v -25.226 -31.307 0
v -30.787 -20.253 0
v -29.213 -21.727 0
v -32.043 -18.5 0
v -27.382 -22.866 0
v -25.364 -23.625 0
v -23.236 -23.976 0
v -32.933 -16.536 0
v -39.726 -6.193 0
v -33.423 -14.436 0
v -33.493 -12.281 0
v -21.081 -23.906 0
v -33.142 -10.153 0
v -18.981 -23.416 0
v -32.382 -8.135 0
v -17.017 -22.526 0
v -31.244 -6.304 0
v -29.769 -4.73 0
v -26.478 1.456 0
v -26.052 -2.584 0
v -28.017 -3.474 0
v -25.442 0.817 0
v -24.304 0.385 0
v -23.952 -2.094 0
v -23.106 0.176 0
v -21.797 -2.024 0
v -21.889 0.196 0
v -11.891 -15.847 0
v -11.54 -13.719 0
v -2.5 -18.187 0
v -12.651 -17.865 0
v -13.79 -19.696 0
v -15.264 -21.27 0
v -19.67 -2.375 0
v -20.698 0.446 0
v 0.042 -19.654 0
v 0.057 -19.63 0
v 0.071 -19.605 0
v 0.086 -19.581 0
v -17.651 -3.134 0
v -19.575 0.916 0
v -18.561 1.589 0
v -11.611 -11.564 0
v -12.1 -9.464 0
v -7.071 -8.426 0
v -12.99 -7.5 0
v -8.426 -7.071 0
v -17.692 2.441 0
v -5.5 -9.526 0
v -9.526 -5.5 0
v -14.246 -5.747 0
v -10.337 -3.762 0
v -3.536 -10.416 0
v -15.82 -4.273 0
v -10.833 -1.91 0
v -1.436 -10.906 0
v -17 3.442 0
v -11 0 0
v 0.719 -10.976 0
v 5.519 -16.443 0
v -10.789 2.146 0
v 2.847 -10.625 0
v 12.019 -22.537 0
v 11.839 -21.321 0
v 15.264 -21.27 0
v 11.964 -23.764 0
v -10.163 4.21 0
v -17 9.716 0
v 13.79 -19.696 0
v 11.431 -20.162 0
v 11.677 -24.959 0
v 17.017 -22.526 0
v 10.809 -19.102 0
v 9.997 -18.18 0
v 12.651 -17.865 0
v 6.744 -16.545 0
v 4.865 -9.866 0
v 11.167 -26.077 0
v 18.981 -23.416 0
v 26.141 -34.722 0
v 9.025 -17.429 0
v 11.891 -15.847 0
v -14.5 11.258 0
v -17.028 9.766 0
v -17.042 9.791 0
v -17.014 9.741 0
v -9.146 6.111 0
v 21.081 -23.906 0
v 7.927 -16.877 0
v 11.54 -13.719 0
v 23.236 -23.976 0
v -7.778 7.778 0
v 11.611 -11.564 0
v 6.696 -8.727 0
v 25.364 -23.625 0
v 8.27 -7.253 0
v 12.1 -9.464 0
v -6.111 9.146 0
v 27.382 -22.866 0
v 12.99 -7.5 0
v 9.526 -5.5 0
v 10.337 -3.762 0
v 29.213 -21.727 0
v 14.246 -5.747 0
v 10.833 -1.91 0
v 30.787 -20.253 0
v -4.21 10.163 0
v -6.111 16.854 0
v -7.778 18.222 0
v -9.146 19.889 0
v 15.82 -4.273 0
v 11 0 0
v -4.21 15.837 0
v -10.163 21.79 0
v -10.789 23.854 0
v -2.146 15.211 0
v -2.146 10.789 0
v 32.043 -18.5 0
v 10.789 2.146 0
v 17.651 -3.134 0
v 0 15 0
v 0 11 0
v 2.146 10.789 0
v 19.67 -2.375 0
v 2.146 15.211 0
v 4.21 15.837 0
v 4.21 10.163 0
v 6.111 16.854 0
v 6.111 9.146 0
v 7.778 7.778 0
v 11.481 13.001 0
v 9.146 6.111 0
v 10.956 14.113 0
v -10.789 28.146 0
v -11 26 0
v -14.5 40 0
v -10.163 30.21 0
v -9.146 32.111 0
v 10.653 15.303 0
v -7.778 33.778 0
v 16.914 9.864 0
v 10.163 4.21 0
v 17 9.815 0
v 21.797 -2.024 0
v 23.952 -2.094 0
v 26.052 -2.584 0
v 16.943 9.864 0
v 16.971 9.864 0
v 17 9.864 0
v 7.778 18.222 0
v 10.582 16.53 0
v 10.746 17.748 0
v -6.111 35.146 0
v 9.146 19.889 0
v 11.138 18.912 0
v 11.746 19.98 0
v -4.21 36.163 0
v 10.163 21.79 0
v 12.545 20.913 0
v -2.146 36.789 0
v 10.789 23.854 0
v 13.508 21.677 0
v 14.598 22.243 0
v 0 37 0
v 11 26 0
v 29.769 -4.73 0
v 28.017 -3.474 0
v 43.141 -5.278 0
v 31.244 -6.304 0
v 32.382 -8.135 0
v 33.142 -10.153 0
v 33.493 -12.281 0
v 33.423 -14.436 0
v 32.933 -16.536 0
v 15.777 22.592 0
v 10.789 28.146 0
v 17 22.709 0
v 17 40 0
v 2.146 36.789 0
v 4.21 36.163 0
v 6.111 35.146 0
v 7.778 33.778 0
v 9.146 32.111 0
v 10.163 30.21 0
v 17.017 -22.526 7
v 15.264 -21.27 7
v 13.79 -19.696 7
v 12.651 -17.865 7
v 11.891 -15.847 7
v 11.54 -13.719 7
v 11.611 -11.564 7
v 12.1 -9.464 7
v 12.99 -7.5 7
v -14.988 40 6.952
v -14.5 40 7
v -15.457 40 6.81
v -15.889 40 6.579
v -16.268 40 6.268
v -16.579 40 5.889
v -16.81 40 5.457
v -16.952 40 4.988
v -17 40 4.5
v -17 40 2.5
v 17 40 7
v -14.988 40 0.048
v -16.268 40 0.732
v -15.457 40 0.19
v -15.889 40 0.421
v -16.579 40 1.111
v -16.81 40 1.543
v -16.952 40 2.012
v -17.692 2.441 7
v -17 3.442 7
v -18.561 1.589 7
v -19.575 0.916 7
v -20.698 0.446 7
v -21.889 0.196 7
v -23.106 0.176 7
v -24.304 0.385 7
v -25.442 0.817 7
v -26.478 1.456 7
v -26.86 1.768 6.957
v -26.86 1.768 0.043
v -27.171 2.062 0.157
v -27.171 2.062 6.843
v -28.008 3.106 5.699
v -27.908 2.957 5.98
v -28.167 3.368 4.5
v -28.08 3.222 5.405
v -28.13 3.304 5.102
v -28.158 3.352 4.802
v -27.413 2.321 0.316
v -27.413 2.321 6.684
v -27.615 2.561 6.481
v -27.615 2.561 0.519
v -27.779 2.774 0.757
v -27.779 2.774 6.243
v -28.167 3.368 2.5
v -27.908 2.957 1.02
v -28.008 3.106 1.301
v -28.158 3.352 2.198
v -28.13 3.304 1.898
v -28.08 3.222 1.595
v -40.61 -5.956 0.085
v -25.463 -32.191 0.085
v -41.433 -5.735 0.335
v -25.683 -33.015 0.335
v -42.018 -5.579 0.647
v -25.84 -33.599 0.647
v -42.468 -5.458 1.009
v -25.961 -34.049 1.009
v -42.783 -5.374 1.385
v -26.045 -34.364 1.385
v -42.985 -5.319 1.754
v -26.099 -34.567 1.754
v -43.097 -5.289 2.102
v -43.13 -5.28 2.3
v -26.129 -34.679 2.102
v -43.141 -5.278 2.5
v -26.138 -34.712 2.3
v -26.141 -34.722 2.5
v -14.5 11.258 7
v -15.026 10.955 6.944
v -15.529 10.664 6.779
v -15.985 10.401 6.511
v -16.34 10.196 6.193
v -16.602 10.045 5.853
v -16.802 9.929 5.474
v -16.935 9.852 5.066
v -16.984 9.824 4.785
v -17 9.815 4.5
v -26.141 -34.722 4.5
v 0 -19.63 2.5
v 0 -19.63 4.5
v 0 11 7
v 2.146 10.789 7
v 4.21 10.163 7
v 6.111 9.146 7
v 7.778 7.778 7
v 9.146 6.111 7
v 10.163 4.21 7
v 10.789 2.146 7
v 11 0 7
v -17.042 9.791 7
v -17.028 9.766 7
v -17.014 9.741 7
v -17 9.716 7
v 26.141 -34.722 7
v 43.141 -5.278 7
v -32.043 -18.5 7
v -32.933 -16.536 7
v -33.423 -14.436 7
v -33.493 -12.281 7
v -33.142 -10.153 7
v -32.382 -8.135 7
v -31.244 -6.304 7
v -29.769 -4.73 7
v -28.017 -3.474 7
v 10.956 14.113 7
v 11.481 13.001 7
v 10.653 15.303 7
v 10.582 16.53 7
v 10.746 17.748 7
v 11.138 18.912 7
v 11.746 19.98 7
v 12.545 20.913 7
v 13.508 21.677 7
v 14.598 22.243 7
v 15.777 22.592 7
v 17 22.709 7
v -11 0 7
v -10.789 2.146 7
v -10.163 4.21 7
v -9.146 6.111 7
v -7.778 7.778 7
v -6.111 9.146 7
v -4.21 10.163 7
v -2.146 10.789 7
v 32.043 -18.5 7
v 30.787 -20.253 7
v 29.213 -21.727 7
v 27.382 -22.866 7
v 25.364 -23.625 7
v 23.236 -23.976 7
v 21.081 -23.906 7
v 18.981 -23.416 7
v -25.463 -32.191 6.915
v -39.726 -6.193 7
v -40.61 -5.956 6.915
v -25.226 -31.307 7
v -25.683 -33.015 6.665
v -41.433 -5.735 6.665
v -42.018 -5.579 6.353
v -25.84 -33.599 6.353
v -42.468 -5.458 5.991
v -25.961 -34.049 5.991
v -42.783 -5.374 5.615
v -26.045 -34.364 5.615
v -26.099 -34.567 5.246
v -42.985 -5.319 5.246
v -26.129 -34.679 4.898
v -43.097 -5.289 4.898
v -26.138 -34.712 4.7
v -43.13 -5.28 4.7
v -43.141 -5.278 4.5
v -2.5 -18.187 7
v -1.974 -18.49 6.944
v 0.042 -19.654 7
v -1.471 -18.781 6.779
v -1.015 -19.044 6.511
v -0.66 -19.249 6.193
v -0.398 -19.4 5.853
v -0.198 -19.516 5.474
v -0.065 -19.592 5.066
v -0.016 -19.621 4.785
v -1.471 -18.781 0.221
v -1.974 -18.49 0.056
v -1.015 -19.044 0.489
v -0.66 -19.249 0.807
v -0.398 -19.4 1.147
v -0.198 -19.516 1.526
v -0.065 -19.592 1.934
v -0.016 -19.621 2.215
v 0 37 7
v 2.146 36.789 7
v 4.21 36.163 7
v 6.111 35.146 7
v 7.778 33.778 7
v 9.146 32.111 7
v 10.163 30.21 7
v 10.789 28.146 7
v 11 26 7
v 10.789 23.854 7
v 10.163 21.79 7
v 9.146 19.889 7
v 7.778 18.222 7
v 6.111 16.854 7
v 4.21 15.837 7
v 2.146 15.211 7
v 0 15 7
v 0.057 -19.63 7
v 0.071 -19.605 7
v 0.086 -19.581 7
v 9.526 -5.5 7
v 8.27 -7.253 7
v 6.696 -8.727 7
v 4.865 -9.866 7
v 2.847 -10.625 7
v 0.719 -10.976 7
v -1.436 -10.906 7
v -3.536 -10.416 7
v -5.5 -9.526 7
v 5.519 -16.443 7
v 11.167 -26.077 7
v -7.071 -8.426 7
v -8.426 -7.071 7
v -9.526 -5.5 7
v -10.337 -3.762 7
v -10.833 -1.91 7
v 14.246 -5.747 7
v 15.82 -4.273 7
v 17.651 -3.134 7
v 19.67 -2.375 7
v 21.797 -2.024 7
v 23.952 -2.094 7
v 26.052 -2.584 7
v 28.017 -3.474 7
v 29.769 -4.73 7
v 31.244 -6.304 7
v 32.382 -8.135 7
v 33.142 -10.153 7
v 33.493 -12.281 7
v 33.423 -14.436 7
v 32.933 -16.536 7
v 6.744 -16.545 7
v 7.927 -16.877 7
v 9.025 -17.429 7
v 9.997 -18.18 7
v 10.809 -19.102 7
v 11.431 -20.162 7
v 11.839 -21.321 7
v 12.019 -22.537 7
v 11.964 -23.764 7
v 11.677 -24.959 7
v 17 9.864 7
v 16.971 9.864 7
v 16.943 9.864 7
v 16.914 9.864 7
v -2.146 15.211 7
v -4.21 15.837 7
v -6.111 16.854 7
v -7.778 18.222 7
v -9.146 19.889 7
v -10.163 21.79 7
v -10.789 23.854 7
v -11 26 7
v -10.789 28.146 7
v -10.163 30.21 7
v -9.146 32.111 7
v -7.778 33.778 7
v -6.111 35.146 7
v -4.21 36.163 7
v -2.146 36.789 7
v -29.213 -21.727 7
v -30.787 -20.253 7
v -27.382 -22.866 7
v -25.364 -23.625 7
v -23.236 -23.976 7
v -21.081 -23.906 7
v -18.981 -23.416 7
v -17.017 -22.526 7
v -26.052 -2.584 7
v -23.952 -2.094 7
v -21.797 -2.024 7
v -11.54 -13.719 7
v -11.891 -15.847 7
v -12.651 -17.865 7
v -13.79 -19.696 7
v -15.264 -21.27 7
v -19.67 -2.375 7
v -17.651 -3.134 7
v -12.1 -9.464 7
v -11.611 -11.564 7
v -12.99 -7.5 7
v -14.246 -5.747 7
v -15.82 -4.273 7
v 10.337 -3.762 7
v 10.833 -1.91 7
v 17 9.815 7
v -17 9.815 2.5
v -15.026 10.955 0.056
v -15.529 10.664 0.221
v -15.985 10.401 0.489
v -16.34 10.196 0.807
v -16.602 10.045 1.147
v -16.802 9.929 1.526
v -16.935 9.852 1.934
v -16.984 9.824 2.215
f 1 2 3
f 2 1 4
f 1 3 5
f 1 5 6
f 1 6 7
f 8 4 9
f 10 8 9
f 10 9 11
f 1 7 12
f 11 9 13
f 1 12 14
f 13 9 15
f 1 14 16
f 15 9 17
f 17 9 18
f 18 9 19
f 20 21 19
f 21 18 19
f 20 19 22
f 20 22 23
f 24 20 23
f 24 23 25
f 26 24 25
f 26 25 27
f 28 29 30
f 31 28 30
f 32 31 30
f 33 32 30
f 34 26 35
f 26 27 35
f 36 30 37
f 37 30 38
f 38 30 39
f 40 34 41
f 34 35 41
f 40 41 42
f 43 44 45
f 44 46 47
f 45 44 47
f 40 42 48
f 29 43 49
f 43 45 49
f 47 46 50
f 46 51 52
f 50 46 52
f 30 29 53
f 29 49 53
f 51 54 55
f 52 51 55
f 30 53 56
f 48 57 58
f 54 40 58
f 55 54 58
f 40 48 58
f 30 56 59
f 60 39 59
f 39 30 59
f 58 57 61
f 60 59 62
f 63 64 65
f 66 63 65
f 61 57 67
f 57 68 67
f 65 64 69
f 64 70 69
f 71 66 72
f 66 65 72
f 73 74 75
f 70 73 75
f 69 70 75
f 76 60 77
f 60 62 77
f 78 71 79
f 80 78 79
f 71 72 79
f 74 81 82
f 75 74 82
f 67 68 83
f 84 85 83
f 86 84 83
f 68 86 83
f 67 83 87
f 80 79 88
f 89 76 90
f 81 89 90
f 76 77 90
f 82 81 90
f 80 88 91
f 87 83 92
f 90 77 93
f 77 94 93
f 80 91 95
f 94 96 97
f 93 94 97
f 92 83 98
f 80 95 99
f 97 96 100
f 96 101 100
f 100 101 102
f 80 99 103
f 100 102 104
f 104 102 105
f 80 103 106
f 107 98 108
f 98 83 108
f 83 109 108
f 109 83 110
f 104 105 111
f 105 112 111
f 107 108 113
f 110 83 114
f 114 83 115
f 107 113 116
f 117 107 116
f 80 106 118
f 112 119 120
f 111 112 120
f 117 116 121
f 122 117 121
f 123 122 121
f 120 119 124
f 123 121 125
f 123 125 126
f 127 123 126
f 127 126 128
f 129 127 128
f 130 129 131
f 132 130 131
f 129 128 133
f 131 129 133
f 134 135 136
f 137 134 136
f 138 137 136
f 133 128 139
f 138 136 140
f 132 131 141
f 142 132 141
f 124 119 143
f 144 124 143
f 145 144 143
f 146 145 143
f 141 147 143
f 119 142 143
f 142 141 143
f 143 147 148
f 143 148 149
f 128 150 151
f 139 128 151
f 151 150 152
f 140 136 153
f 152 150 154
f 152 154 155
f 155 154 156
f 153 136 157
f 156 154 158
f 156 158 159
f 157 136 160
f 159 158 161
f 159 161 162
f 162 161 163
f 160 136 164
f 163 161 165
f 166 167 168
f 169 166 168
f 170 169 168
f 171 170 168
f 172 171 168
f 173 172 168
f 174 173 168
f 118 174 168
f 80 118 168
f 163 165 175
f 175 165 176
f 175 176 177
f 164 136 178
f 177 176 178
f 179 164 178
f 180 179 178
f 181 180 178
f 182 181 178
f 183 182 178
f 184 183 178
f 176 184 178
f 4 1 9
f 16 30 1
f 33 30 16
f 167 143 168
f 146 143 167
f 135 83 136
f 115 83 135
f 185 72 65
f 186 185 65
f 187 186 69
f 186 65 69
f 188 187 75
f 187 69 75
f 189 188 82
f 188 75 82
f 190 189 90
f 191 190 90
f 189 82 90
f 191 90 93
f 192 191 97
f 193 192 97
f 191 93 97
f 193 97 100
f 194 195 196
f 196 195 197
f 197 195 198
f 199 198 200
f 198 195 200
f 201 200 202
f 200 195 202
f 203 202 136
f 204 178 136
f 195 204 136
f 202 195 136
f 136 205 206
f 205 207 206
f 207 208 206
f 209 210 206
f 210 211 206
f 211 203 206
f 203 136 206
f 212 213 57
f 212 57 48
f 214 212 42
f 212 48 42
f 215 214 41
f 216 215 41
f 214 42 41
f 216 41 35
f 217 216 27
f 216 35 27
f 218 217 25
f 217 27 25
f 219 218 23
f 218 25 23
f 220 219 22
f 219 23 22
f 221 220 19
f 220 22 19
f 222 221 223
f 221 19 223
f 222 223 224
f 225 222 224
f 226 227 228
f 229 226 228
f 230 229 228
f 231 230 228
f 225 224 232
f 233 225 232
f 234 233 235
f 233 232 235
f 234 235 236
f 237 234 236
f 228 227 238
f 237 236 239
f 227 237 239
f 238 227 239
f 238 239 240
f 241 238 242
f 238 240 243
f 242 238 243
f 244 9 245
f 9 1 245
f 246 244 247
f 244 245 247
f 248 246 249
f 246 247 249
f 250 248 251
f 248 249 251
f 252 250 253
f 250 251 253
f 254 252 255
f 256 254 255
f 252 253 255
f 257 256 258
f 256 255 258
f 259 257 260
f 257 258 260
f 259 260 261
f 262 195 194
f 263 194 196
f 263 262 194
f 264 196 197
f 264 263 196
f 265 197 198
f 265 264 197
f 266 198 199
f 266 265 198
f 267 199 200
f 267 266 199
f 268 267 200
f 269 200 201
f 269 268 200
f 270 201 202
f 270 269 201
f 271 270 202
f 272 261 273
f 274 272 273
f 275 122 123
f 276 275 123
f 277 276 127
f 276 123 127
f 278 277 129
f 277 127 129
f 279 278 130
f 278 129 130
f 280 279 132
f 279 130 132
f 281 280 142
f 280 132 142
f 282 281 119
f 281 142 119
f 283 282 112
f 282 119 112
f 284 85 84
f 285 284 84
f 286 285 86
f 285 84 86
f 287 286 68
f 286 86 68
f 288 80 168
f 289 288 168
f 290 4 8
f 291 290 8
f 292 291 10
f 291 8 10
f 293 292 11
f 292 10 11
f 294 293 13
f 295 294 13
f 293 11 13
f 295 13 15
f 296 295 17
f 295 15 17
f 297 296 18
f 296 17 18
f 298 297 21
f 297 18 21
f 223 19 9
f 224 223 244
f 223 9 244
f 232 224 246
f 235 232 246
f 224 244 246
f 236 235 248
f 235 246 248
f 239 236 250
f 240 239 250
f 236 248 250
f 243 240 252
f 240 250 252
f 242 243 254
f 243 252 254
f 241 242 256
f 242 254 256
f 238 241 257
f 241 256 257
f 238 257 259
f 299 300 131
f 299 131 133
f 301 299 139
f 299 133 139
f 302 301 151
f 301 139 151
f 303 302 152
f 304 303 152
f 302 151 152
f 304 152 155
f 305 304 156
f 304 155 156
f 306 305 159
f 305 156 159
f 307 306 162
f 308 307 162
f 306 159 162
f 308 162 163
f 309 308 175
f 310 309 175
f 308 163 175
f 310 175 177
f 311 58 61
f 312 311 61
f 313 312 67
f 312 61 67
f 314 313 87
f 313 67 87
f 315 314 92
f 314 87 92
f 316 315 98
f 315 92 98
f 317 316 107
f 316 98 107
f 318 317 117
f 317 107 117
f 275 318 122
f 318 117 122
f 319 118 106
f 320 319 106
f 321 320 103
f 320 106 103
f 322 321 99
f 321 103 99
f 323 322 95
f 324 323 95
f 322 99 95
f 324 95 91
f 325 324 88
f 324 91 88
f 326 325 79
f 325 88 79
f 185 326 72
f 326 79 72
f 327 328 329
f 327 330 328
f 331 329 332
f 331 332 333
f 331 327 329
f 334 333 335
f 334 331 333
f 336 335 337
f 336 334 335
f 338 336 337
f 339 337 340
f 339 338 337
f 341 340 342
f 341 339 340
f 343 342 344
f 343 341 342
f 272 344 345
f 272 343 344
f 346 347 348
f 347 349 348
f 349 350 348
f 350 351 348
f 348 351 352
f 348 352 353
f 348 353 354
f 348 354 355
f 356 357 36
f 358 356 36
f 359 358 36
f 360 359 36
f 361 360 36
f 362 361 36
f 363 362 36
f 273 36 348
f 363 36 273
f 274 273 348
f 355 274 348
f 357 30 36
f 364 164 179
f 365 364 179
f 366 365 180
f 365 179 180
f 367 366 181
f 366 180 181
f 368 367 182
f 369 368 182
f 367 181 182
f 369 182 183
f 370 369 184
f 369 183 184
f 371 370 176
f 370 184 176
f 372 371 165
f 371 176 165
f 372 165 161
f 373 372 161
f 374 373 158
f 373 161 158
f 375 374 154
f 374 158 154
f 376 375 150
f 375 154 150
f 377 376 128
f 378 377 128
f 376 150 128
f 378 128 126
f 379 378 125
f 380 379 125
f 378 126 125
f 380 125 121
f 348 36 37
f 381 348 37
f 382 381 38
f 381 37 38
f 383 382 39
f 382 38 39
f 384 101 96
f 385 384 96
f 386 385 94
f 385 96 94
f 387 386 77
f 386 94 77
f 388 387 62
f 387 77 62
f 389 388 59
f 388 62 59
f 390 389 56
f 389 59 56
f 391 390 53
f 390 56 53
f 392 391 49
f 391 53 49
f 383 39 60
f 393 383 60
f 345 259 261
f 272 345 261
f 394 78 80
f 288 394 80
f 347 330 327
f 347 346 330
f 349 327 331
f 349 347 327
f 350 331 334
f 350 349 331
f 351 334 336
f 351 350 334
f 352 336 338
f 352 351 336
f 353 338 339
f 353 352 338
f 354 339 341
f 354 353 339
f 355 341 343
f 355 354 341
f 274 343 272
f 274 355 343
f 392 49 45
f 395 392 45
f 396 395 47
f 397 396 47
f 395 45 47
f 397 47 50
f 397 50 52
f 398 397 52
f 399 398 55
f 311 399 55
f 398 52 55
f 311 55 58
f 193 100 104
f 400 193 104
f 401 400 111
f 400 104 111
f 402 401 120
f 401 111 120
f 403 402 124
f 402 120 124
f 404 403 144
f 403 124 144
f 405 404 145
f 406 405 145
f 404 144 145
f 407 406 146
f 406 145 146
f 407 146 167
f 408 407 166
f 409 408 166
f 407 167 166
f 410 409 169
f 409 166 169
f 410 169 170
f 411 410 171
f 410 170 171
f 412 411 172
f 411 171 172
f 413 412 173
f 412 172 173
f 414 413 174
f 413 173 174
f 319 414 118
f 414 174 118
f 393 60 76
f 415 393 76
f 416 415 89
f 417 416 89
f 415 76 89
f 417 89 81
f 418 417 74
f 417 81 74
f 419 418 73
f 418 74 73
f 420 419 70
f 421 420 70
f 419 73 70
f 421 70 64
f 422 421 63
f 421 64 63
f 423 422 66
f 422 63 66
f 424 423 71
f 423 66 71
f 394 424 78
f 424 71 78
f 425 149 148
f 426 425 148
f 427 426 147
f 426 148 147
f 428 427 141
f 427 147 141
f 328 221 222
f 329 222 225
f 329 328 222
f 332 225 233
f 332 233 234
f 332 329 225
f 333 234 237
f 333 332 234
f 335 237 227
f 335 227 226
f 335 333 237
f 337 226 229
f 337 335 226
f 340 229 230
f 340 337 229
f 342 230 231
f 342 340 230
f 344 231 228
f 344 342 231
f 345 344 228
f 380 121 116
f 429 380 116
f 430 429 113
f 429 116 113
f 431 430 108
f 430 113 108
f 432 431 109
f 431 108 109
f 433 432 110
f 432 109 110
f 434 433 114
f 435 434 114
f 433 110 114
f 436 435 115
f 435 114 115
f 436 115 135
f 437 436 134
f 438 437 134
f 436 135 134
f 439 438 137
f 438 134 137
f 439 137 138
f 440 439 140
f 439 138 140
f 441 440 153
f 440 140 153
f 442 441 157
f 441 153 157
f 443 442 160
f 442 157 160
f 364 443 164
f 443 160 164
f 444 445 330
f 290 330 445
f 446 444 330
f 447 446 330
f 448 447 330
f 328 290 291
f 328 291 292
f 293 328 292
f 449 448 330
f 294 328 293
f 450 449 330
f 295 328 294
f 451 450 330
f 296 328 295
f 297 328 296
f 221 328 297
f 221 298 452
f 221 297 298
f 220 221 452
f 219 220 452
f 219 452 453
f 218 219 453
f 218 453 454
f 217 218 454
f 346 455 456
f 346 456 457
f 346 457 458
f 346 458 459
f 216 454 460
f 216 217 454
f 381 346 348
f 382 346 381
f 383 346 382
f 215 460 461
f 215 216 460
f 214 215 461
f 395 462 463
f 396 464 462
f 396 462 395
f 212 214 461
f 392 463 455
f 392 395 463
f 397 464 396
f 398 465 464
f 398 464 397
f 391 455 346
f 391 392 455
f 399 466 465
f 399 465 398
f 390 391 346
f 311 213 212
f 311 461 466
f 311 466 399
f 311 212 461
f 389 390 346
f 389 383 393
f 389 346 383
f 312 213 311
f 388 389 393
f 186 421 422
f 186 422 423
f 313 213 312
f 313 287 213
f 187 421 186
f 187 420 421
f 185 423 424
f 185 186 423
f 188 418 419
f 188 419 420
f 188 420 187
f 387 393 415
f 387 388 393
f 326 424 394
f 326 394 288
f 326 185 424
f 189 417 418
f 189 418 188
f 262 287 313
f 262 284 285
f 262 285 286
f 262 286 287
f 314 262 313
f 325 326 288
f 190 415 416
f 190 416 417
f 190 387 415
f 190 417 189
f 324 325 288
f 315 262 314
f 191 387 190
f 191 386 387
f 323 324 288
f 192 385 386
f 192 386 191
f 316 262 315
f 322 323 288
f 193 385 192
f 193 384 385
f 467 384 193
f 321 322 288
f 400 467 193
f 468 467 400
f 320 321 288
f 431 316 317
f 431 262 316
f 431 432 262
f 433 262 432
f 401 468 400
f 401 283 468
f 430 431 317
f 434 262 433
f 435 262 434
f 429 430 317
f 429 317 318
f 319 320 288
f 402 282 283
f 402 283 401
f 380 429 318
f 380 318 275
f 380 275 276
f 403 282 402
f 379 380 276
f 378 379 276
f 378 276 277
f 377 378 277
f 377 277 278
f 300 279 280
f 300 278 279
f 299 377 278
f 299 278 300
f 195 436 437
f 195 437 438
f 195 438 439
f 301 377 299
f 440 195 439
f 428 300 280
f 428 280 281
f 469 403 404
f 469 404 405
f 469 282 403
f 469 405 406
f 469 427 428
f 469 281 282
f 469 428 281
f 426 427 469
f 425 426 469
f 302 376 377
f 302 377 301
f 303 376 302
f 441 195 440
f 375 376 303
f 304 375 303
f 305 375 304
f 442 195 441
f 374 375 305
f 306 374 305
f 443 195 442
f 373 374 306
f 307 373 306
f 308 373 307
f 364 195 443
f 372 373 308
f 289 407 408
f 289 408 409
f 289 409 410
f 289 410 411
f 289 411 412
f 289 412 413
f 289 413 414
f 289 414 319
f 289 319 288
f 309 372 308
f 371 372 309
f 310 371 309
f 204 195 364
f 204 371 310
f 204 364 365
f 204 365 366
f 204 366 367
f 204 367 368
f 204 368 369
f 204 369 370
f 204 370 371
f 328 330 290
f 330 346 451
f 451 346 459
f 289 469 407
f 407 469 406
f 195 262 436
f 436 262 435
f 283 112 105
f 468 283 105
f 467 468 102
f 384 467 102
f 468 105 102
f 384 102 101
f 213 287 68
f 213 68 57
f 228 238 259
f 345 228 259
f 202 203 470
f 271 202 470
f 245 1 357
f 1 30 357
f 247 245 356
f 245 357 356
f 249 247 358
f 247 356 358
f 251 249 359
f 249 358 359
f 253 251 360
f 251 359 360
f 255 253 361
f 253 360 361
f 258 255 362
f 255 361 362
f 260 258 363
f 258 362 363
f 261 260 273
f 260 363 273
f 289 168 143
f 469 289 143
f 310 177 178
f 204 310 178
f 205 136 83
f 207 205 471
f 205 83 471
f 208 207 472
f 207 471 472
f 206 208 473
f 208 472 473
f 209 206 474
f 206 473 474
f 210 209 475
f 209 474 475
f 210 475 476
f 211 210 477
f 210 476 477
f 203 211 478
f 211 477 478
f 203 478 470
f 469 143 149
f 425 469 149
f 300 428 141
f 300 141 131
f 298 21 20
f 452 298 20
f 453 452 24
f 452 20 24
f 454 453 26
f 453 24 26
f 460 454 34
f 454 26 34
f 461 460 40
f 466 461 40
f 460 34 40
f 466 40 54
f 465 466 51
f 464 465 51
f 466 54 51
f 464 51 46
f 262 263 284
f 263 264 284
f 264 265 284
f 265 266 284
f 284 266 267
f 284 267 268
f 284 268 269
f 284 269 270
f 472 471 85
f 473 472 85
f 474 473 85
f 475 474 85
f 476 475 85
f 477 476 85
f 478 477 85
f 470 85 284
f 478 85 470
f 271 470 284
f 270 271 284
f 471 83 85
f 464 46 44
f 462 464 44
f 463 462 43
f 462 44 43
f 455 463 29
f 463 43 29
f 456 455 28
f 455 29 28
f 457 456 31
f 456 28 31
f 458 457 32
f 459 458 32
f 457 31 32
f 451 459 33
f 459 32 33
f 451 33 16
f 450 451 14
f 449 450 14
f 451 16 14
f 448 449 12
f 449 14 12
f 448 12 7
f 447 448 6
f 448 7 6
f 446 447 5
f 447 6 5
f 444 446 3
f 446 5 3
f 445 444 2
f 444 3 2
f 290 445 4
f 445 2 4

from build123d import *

# Parameters (mm, degrees)
F1_DEPTH = 7
F3_ANGLE = 240
F4_ANGLE = 120
F6_R     = 2.5


with BuildPart() as f1:
    # F0 (on Top) → F1 (new body)
    with BuildSketch(Plane.XY):
        with BuildLine():
            ThreePointArc((-11, 0), (-7.7781745931, 7.7781745931), (0, 11))
            Line((0, 11), (0, 15))
            ThreePointArc((0, 15), (-11, 26), (0, 37))
            Line((0, 37), (0, 40))
            Line((0, 40), (-17, 40))
            Line((-17, 40), (-17, 0))
            Line((-17, 0), (-11, 0))
        make_face()
        with BuildLine():
            ThreePointArc((0, 11), (7.7781745931, 7.7781745931), (11, 0))
            Line((11, 0), (17, 0))
            Line((17, 0), (17, 9.8637529312))
            ThreePointArc((17, 9.8637529312), (10.5771972535, 16.2865556777), (17, 22.7093584241))
            Line((17, 22.7093584241), (17, 40))
            Line((17, 40), (0, 40))
            Line((0, 40), (0, 37))
            ThreePointArc((0, 37), (7.7781745931, 33.7781745931), (11, 26))
            ThreePointArc((11, 26), (7.7781745931, 18.2218254069), (0, 15))
            Line((0, 15), (0, 11))
        make_face()
    extrude(amount=F1_DEPTH)


with BuildPart() as f3_1:
    # F3: copy of F1
    add(f1.part.rotate(Axis((0, 0, 24.7764140368), (0, 0, 1)), F3_ANGLE))


with BuildPart() as f4_1:
    # F4: copy of F1
    add(f1.part.rotate(Axis((0, 0, 24.7764140368), (0, 0, 1)), F4_ANGLE))


with BuildPart() as f1_1:
    add(f1.part)

    # F5: union F3_1, F4_1
    add(f3_1.part)
    add(f4_1.part)

    # F6
    f6_edges = [f1_1.edges().sort_by_distance(p)[0] for p in [
        (-17, 24.907477, 7),
        (-17, 24.907477, 0),
        (-35.653949, -0.954908, 7),
        (-35.653949, -0.954908, 0),
        (-13.070508, -27.176171, 7),
        (-13.070508, -27.176171, 0),
        (-34.641016, -20, 7),
        (-34.641016, -20, 0),
    ]]
    fillet(f6_edges, radius=F6_R)


solid = f1_1.part
